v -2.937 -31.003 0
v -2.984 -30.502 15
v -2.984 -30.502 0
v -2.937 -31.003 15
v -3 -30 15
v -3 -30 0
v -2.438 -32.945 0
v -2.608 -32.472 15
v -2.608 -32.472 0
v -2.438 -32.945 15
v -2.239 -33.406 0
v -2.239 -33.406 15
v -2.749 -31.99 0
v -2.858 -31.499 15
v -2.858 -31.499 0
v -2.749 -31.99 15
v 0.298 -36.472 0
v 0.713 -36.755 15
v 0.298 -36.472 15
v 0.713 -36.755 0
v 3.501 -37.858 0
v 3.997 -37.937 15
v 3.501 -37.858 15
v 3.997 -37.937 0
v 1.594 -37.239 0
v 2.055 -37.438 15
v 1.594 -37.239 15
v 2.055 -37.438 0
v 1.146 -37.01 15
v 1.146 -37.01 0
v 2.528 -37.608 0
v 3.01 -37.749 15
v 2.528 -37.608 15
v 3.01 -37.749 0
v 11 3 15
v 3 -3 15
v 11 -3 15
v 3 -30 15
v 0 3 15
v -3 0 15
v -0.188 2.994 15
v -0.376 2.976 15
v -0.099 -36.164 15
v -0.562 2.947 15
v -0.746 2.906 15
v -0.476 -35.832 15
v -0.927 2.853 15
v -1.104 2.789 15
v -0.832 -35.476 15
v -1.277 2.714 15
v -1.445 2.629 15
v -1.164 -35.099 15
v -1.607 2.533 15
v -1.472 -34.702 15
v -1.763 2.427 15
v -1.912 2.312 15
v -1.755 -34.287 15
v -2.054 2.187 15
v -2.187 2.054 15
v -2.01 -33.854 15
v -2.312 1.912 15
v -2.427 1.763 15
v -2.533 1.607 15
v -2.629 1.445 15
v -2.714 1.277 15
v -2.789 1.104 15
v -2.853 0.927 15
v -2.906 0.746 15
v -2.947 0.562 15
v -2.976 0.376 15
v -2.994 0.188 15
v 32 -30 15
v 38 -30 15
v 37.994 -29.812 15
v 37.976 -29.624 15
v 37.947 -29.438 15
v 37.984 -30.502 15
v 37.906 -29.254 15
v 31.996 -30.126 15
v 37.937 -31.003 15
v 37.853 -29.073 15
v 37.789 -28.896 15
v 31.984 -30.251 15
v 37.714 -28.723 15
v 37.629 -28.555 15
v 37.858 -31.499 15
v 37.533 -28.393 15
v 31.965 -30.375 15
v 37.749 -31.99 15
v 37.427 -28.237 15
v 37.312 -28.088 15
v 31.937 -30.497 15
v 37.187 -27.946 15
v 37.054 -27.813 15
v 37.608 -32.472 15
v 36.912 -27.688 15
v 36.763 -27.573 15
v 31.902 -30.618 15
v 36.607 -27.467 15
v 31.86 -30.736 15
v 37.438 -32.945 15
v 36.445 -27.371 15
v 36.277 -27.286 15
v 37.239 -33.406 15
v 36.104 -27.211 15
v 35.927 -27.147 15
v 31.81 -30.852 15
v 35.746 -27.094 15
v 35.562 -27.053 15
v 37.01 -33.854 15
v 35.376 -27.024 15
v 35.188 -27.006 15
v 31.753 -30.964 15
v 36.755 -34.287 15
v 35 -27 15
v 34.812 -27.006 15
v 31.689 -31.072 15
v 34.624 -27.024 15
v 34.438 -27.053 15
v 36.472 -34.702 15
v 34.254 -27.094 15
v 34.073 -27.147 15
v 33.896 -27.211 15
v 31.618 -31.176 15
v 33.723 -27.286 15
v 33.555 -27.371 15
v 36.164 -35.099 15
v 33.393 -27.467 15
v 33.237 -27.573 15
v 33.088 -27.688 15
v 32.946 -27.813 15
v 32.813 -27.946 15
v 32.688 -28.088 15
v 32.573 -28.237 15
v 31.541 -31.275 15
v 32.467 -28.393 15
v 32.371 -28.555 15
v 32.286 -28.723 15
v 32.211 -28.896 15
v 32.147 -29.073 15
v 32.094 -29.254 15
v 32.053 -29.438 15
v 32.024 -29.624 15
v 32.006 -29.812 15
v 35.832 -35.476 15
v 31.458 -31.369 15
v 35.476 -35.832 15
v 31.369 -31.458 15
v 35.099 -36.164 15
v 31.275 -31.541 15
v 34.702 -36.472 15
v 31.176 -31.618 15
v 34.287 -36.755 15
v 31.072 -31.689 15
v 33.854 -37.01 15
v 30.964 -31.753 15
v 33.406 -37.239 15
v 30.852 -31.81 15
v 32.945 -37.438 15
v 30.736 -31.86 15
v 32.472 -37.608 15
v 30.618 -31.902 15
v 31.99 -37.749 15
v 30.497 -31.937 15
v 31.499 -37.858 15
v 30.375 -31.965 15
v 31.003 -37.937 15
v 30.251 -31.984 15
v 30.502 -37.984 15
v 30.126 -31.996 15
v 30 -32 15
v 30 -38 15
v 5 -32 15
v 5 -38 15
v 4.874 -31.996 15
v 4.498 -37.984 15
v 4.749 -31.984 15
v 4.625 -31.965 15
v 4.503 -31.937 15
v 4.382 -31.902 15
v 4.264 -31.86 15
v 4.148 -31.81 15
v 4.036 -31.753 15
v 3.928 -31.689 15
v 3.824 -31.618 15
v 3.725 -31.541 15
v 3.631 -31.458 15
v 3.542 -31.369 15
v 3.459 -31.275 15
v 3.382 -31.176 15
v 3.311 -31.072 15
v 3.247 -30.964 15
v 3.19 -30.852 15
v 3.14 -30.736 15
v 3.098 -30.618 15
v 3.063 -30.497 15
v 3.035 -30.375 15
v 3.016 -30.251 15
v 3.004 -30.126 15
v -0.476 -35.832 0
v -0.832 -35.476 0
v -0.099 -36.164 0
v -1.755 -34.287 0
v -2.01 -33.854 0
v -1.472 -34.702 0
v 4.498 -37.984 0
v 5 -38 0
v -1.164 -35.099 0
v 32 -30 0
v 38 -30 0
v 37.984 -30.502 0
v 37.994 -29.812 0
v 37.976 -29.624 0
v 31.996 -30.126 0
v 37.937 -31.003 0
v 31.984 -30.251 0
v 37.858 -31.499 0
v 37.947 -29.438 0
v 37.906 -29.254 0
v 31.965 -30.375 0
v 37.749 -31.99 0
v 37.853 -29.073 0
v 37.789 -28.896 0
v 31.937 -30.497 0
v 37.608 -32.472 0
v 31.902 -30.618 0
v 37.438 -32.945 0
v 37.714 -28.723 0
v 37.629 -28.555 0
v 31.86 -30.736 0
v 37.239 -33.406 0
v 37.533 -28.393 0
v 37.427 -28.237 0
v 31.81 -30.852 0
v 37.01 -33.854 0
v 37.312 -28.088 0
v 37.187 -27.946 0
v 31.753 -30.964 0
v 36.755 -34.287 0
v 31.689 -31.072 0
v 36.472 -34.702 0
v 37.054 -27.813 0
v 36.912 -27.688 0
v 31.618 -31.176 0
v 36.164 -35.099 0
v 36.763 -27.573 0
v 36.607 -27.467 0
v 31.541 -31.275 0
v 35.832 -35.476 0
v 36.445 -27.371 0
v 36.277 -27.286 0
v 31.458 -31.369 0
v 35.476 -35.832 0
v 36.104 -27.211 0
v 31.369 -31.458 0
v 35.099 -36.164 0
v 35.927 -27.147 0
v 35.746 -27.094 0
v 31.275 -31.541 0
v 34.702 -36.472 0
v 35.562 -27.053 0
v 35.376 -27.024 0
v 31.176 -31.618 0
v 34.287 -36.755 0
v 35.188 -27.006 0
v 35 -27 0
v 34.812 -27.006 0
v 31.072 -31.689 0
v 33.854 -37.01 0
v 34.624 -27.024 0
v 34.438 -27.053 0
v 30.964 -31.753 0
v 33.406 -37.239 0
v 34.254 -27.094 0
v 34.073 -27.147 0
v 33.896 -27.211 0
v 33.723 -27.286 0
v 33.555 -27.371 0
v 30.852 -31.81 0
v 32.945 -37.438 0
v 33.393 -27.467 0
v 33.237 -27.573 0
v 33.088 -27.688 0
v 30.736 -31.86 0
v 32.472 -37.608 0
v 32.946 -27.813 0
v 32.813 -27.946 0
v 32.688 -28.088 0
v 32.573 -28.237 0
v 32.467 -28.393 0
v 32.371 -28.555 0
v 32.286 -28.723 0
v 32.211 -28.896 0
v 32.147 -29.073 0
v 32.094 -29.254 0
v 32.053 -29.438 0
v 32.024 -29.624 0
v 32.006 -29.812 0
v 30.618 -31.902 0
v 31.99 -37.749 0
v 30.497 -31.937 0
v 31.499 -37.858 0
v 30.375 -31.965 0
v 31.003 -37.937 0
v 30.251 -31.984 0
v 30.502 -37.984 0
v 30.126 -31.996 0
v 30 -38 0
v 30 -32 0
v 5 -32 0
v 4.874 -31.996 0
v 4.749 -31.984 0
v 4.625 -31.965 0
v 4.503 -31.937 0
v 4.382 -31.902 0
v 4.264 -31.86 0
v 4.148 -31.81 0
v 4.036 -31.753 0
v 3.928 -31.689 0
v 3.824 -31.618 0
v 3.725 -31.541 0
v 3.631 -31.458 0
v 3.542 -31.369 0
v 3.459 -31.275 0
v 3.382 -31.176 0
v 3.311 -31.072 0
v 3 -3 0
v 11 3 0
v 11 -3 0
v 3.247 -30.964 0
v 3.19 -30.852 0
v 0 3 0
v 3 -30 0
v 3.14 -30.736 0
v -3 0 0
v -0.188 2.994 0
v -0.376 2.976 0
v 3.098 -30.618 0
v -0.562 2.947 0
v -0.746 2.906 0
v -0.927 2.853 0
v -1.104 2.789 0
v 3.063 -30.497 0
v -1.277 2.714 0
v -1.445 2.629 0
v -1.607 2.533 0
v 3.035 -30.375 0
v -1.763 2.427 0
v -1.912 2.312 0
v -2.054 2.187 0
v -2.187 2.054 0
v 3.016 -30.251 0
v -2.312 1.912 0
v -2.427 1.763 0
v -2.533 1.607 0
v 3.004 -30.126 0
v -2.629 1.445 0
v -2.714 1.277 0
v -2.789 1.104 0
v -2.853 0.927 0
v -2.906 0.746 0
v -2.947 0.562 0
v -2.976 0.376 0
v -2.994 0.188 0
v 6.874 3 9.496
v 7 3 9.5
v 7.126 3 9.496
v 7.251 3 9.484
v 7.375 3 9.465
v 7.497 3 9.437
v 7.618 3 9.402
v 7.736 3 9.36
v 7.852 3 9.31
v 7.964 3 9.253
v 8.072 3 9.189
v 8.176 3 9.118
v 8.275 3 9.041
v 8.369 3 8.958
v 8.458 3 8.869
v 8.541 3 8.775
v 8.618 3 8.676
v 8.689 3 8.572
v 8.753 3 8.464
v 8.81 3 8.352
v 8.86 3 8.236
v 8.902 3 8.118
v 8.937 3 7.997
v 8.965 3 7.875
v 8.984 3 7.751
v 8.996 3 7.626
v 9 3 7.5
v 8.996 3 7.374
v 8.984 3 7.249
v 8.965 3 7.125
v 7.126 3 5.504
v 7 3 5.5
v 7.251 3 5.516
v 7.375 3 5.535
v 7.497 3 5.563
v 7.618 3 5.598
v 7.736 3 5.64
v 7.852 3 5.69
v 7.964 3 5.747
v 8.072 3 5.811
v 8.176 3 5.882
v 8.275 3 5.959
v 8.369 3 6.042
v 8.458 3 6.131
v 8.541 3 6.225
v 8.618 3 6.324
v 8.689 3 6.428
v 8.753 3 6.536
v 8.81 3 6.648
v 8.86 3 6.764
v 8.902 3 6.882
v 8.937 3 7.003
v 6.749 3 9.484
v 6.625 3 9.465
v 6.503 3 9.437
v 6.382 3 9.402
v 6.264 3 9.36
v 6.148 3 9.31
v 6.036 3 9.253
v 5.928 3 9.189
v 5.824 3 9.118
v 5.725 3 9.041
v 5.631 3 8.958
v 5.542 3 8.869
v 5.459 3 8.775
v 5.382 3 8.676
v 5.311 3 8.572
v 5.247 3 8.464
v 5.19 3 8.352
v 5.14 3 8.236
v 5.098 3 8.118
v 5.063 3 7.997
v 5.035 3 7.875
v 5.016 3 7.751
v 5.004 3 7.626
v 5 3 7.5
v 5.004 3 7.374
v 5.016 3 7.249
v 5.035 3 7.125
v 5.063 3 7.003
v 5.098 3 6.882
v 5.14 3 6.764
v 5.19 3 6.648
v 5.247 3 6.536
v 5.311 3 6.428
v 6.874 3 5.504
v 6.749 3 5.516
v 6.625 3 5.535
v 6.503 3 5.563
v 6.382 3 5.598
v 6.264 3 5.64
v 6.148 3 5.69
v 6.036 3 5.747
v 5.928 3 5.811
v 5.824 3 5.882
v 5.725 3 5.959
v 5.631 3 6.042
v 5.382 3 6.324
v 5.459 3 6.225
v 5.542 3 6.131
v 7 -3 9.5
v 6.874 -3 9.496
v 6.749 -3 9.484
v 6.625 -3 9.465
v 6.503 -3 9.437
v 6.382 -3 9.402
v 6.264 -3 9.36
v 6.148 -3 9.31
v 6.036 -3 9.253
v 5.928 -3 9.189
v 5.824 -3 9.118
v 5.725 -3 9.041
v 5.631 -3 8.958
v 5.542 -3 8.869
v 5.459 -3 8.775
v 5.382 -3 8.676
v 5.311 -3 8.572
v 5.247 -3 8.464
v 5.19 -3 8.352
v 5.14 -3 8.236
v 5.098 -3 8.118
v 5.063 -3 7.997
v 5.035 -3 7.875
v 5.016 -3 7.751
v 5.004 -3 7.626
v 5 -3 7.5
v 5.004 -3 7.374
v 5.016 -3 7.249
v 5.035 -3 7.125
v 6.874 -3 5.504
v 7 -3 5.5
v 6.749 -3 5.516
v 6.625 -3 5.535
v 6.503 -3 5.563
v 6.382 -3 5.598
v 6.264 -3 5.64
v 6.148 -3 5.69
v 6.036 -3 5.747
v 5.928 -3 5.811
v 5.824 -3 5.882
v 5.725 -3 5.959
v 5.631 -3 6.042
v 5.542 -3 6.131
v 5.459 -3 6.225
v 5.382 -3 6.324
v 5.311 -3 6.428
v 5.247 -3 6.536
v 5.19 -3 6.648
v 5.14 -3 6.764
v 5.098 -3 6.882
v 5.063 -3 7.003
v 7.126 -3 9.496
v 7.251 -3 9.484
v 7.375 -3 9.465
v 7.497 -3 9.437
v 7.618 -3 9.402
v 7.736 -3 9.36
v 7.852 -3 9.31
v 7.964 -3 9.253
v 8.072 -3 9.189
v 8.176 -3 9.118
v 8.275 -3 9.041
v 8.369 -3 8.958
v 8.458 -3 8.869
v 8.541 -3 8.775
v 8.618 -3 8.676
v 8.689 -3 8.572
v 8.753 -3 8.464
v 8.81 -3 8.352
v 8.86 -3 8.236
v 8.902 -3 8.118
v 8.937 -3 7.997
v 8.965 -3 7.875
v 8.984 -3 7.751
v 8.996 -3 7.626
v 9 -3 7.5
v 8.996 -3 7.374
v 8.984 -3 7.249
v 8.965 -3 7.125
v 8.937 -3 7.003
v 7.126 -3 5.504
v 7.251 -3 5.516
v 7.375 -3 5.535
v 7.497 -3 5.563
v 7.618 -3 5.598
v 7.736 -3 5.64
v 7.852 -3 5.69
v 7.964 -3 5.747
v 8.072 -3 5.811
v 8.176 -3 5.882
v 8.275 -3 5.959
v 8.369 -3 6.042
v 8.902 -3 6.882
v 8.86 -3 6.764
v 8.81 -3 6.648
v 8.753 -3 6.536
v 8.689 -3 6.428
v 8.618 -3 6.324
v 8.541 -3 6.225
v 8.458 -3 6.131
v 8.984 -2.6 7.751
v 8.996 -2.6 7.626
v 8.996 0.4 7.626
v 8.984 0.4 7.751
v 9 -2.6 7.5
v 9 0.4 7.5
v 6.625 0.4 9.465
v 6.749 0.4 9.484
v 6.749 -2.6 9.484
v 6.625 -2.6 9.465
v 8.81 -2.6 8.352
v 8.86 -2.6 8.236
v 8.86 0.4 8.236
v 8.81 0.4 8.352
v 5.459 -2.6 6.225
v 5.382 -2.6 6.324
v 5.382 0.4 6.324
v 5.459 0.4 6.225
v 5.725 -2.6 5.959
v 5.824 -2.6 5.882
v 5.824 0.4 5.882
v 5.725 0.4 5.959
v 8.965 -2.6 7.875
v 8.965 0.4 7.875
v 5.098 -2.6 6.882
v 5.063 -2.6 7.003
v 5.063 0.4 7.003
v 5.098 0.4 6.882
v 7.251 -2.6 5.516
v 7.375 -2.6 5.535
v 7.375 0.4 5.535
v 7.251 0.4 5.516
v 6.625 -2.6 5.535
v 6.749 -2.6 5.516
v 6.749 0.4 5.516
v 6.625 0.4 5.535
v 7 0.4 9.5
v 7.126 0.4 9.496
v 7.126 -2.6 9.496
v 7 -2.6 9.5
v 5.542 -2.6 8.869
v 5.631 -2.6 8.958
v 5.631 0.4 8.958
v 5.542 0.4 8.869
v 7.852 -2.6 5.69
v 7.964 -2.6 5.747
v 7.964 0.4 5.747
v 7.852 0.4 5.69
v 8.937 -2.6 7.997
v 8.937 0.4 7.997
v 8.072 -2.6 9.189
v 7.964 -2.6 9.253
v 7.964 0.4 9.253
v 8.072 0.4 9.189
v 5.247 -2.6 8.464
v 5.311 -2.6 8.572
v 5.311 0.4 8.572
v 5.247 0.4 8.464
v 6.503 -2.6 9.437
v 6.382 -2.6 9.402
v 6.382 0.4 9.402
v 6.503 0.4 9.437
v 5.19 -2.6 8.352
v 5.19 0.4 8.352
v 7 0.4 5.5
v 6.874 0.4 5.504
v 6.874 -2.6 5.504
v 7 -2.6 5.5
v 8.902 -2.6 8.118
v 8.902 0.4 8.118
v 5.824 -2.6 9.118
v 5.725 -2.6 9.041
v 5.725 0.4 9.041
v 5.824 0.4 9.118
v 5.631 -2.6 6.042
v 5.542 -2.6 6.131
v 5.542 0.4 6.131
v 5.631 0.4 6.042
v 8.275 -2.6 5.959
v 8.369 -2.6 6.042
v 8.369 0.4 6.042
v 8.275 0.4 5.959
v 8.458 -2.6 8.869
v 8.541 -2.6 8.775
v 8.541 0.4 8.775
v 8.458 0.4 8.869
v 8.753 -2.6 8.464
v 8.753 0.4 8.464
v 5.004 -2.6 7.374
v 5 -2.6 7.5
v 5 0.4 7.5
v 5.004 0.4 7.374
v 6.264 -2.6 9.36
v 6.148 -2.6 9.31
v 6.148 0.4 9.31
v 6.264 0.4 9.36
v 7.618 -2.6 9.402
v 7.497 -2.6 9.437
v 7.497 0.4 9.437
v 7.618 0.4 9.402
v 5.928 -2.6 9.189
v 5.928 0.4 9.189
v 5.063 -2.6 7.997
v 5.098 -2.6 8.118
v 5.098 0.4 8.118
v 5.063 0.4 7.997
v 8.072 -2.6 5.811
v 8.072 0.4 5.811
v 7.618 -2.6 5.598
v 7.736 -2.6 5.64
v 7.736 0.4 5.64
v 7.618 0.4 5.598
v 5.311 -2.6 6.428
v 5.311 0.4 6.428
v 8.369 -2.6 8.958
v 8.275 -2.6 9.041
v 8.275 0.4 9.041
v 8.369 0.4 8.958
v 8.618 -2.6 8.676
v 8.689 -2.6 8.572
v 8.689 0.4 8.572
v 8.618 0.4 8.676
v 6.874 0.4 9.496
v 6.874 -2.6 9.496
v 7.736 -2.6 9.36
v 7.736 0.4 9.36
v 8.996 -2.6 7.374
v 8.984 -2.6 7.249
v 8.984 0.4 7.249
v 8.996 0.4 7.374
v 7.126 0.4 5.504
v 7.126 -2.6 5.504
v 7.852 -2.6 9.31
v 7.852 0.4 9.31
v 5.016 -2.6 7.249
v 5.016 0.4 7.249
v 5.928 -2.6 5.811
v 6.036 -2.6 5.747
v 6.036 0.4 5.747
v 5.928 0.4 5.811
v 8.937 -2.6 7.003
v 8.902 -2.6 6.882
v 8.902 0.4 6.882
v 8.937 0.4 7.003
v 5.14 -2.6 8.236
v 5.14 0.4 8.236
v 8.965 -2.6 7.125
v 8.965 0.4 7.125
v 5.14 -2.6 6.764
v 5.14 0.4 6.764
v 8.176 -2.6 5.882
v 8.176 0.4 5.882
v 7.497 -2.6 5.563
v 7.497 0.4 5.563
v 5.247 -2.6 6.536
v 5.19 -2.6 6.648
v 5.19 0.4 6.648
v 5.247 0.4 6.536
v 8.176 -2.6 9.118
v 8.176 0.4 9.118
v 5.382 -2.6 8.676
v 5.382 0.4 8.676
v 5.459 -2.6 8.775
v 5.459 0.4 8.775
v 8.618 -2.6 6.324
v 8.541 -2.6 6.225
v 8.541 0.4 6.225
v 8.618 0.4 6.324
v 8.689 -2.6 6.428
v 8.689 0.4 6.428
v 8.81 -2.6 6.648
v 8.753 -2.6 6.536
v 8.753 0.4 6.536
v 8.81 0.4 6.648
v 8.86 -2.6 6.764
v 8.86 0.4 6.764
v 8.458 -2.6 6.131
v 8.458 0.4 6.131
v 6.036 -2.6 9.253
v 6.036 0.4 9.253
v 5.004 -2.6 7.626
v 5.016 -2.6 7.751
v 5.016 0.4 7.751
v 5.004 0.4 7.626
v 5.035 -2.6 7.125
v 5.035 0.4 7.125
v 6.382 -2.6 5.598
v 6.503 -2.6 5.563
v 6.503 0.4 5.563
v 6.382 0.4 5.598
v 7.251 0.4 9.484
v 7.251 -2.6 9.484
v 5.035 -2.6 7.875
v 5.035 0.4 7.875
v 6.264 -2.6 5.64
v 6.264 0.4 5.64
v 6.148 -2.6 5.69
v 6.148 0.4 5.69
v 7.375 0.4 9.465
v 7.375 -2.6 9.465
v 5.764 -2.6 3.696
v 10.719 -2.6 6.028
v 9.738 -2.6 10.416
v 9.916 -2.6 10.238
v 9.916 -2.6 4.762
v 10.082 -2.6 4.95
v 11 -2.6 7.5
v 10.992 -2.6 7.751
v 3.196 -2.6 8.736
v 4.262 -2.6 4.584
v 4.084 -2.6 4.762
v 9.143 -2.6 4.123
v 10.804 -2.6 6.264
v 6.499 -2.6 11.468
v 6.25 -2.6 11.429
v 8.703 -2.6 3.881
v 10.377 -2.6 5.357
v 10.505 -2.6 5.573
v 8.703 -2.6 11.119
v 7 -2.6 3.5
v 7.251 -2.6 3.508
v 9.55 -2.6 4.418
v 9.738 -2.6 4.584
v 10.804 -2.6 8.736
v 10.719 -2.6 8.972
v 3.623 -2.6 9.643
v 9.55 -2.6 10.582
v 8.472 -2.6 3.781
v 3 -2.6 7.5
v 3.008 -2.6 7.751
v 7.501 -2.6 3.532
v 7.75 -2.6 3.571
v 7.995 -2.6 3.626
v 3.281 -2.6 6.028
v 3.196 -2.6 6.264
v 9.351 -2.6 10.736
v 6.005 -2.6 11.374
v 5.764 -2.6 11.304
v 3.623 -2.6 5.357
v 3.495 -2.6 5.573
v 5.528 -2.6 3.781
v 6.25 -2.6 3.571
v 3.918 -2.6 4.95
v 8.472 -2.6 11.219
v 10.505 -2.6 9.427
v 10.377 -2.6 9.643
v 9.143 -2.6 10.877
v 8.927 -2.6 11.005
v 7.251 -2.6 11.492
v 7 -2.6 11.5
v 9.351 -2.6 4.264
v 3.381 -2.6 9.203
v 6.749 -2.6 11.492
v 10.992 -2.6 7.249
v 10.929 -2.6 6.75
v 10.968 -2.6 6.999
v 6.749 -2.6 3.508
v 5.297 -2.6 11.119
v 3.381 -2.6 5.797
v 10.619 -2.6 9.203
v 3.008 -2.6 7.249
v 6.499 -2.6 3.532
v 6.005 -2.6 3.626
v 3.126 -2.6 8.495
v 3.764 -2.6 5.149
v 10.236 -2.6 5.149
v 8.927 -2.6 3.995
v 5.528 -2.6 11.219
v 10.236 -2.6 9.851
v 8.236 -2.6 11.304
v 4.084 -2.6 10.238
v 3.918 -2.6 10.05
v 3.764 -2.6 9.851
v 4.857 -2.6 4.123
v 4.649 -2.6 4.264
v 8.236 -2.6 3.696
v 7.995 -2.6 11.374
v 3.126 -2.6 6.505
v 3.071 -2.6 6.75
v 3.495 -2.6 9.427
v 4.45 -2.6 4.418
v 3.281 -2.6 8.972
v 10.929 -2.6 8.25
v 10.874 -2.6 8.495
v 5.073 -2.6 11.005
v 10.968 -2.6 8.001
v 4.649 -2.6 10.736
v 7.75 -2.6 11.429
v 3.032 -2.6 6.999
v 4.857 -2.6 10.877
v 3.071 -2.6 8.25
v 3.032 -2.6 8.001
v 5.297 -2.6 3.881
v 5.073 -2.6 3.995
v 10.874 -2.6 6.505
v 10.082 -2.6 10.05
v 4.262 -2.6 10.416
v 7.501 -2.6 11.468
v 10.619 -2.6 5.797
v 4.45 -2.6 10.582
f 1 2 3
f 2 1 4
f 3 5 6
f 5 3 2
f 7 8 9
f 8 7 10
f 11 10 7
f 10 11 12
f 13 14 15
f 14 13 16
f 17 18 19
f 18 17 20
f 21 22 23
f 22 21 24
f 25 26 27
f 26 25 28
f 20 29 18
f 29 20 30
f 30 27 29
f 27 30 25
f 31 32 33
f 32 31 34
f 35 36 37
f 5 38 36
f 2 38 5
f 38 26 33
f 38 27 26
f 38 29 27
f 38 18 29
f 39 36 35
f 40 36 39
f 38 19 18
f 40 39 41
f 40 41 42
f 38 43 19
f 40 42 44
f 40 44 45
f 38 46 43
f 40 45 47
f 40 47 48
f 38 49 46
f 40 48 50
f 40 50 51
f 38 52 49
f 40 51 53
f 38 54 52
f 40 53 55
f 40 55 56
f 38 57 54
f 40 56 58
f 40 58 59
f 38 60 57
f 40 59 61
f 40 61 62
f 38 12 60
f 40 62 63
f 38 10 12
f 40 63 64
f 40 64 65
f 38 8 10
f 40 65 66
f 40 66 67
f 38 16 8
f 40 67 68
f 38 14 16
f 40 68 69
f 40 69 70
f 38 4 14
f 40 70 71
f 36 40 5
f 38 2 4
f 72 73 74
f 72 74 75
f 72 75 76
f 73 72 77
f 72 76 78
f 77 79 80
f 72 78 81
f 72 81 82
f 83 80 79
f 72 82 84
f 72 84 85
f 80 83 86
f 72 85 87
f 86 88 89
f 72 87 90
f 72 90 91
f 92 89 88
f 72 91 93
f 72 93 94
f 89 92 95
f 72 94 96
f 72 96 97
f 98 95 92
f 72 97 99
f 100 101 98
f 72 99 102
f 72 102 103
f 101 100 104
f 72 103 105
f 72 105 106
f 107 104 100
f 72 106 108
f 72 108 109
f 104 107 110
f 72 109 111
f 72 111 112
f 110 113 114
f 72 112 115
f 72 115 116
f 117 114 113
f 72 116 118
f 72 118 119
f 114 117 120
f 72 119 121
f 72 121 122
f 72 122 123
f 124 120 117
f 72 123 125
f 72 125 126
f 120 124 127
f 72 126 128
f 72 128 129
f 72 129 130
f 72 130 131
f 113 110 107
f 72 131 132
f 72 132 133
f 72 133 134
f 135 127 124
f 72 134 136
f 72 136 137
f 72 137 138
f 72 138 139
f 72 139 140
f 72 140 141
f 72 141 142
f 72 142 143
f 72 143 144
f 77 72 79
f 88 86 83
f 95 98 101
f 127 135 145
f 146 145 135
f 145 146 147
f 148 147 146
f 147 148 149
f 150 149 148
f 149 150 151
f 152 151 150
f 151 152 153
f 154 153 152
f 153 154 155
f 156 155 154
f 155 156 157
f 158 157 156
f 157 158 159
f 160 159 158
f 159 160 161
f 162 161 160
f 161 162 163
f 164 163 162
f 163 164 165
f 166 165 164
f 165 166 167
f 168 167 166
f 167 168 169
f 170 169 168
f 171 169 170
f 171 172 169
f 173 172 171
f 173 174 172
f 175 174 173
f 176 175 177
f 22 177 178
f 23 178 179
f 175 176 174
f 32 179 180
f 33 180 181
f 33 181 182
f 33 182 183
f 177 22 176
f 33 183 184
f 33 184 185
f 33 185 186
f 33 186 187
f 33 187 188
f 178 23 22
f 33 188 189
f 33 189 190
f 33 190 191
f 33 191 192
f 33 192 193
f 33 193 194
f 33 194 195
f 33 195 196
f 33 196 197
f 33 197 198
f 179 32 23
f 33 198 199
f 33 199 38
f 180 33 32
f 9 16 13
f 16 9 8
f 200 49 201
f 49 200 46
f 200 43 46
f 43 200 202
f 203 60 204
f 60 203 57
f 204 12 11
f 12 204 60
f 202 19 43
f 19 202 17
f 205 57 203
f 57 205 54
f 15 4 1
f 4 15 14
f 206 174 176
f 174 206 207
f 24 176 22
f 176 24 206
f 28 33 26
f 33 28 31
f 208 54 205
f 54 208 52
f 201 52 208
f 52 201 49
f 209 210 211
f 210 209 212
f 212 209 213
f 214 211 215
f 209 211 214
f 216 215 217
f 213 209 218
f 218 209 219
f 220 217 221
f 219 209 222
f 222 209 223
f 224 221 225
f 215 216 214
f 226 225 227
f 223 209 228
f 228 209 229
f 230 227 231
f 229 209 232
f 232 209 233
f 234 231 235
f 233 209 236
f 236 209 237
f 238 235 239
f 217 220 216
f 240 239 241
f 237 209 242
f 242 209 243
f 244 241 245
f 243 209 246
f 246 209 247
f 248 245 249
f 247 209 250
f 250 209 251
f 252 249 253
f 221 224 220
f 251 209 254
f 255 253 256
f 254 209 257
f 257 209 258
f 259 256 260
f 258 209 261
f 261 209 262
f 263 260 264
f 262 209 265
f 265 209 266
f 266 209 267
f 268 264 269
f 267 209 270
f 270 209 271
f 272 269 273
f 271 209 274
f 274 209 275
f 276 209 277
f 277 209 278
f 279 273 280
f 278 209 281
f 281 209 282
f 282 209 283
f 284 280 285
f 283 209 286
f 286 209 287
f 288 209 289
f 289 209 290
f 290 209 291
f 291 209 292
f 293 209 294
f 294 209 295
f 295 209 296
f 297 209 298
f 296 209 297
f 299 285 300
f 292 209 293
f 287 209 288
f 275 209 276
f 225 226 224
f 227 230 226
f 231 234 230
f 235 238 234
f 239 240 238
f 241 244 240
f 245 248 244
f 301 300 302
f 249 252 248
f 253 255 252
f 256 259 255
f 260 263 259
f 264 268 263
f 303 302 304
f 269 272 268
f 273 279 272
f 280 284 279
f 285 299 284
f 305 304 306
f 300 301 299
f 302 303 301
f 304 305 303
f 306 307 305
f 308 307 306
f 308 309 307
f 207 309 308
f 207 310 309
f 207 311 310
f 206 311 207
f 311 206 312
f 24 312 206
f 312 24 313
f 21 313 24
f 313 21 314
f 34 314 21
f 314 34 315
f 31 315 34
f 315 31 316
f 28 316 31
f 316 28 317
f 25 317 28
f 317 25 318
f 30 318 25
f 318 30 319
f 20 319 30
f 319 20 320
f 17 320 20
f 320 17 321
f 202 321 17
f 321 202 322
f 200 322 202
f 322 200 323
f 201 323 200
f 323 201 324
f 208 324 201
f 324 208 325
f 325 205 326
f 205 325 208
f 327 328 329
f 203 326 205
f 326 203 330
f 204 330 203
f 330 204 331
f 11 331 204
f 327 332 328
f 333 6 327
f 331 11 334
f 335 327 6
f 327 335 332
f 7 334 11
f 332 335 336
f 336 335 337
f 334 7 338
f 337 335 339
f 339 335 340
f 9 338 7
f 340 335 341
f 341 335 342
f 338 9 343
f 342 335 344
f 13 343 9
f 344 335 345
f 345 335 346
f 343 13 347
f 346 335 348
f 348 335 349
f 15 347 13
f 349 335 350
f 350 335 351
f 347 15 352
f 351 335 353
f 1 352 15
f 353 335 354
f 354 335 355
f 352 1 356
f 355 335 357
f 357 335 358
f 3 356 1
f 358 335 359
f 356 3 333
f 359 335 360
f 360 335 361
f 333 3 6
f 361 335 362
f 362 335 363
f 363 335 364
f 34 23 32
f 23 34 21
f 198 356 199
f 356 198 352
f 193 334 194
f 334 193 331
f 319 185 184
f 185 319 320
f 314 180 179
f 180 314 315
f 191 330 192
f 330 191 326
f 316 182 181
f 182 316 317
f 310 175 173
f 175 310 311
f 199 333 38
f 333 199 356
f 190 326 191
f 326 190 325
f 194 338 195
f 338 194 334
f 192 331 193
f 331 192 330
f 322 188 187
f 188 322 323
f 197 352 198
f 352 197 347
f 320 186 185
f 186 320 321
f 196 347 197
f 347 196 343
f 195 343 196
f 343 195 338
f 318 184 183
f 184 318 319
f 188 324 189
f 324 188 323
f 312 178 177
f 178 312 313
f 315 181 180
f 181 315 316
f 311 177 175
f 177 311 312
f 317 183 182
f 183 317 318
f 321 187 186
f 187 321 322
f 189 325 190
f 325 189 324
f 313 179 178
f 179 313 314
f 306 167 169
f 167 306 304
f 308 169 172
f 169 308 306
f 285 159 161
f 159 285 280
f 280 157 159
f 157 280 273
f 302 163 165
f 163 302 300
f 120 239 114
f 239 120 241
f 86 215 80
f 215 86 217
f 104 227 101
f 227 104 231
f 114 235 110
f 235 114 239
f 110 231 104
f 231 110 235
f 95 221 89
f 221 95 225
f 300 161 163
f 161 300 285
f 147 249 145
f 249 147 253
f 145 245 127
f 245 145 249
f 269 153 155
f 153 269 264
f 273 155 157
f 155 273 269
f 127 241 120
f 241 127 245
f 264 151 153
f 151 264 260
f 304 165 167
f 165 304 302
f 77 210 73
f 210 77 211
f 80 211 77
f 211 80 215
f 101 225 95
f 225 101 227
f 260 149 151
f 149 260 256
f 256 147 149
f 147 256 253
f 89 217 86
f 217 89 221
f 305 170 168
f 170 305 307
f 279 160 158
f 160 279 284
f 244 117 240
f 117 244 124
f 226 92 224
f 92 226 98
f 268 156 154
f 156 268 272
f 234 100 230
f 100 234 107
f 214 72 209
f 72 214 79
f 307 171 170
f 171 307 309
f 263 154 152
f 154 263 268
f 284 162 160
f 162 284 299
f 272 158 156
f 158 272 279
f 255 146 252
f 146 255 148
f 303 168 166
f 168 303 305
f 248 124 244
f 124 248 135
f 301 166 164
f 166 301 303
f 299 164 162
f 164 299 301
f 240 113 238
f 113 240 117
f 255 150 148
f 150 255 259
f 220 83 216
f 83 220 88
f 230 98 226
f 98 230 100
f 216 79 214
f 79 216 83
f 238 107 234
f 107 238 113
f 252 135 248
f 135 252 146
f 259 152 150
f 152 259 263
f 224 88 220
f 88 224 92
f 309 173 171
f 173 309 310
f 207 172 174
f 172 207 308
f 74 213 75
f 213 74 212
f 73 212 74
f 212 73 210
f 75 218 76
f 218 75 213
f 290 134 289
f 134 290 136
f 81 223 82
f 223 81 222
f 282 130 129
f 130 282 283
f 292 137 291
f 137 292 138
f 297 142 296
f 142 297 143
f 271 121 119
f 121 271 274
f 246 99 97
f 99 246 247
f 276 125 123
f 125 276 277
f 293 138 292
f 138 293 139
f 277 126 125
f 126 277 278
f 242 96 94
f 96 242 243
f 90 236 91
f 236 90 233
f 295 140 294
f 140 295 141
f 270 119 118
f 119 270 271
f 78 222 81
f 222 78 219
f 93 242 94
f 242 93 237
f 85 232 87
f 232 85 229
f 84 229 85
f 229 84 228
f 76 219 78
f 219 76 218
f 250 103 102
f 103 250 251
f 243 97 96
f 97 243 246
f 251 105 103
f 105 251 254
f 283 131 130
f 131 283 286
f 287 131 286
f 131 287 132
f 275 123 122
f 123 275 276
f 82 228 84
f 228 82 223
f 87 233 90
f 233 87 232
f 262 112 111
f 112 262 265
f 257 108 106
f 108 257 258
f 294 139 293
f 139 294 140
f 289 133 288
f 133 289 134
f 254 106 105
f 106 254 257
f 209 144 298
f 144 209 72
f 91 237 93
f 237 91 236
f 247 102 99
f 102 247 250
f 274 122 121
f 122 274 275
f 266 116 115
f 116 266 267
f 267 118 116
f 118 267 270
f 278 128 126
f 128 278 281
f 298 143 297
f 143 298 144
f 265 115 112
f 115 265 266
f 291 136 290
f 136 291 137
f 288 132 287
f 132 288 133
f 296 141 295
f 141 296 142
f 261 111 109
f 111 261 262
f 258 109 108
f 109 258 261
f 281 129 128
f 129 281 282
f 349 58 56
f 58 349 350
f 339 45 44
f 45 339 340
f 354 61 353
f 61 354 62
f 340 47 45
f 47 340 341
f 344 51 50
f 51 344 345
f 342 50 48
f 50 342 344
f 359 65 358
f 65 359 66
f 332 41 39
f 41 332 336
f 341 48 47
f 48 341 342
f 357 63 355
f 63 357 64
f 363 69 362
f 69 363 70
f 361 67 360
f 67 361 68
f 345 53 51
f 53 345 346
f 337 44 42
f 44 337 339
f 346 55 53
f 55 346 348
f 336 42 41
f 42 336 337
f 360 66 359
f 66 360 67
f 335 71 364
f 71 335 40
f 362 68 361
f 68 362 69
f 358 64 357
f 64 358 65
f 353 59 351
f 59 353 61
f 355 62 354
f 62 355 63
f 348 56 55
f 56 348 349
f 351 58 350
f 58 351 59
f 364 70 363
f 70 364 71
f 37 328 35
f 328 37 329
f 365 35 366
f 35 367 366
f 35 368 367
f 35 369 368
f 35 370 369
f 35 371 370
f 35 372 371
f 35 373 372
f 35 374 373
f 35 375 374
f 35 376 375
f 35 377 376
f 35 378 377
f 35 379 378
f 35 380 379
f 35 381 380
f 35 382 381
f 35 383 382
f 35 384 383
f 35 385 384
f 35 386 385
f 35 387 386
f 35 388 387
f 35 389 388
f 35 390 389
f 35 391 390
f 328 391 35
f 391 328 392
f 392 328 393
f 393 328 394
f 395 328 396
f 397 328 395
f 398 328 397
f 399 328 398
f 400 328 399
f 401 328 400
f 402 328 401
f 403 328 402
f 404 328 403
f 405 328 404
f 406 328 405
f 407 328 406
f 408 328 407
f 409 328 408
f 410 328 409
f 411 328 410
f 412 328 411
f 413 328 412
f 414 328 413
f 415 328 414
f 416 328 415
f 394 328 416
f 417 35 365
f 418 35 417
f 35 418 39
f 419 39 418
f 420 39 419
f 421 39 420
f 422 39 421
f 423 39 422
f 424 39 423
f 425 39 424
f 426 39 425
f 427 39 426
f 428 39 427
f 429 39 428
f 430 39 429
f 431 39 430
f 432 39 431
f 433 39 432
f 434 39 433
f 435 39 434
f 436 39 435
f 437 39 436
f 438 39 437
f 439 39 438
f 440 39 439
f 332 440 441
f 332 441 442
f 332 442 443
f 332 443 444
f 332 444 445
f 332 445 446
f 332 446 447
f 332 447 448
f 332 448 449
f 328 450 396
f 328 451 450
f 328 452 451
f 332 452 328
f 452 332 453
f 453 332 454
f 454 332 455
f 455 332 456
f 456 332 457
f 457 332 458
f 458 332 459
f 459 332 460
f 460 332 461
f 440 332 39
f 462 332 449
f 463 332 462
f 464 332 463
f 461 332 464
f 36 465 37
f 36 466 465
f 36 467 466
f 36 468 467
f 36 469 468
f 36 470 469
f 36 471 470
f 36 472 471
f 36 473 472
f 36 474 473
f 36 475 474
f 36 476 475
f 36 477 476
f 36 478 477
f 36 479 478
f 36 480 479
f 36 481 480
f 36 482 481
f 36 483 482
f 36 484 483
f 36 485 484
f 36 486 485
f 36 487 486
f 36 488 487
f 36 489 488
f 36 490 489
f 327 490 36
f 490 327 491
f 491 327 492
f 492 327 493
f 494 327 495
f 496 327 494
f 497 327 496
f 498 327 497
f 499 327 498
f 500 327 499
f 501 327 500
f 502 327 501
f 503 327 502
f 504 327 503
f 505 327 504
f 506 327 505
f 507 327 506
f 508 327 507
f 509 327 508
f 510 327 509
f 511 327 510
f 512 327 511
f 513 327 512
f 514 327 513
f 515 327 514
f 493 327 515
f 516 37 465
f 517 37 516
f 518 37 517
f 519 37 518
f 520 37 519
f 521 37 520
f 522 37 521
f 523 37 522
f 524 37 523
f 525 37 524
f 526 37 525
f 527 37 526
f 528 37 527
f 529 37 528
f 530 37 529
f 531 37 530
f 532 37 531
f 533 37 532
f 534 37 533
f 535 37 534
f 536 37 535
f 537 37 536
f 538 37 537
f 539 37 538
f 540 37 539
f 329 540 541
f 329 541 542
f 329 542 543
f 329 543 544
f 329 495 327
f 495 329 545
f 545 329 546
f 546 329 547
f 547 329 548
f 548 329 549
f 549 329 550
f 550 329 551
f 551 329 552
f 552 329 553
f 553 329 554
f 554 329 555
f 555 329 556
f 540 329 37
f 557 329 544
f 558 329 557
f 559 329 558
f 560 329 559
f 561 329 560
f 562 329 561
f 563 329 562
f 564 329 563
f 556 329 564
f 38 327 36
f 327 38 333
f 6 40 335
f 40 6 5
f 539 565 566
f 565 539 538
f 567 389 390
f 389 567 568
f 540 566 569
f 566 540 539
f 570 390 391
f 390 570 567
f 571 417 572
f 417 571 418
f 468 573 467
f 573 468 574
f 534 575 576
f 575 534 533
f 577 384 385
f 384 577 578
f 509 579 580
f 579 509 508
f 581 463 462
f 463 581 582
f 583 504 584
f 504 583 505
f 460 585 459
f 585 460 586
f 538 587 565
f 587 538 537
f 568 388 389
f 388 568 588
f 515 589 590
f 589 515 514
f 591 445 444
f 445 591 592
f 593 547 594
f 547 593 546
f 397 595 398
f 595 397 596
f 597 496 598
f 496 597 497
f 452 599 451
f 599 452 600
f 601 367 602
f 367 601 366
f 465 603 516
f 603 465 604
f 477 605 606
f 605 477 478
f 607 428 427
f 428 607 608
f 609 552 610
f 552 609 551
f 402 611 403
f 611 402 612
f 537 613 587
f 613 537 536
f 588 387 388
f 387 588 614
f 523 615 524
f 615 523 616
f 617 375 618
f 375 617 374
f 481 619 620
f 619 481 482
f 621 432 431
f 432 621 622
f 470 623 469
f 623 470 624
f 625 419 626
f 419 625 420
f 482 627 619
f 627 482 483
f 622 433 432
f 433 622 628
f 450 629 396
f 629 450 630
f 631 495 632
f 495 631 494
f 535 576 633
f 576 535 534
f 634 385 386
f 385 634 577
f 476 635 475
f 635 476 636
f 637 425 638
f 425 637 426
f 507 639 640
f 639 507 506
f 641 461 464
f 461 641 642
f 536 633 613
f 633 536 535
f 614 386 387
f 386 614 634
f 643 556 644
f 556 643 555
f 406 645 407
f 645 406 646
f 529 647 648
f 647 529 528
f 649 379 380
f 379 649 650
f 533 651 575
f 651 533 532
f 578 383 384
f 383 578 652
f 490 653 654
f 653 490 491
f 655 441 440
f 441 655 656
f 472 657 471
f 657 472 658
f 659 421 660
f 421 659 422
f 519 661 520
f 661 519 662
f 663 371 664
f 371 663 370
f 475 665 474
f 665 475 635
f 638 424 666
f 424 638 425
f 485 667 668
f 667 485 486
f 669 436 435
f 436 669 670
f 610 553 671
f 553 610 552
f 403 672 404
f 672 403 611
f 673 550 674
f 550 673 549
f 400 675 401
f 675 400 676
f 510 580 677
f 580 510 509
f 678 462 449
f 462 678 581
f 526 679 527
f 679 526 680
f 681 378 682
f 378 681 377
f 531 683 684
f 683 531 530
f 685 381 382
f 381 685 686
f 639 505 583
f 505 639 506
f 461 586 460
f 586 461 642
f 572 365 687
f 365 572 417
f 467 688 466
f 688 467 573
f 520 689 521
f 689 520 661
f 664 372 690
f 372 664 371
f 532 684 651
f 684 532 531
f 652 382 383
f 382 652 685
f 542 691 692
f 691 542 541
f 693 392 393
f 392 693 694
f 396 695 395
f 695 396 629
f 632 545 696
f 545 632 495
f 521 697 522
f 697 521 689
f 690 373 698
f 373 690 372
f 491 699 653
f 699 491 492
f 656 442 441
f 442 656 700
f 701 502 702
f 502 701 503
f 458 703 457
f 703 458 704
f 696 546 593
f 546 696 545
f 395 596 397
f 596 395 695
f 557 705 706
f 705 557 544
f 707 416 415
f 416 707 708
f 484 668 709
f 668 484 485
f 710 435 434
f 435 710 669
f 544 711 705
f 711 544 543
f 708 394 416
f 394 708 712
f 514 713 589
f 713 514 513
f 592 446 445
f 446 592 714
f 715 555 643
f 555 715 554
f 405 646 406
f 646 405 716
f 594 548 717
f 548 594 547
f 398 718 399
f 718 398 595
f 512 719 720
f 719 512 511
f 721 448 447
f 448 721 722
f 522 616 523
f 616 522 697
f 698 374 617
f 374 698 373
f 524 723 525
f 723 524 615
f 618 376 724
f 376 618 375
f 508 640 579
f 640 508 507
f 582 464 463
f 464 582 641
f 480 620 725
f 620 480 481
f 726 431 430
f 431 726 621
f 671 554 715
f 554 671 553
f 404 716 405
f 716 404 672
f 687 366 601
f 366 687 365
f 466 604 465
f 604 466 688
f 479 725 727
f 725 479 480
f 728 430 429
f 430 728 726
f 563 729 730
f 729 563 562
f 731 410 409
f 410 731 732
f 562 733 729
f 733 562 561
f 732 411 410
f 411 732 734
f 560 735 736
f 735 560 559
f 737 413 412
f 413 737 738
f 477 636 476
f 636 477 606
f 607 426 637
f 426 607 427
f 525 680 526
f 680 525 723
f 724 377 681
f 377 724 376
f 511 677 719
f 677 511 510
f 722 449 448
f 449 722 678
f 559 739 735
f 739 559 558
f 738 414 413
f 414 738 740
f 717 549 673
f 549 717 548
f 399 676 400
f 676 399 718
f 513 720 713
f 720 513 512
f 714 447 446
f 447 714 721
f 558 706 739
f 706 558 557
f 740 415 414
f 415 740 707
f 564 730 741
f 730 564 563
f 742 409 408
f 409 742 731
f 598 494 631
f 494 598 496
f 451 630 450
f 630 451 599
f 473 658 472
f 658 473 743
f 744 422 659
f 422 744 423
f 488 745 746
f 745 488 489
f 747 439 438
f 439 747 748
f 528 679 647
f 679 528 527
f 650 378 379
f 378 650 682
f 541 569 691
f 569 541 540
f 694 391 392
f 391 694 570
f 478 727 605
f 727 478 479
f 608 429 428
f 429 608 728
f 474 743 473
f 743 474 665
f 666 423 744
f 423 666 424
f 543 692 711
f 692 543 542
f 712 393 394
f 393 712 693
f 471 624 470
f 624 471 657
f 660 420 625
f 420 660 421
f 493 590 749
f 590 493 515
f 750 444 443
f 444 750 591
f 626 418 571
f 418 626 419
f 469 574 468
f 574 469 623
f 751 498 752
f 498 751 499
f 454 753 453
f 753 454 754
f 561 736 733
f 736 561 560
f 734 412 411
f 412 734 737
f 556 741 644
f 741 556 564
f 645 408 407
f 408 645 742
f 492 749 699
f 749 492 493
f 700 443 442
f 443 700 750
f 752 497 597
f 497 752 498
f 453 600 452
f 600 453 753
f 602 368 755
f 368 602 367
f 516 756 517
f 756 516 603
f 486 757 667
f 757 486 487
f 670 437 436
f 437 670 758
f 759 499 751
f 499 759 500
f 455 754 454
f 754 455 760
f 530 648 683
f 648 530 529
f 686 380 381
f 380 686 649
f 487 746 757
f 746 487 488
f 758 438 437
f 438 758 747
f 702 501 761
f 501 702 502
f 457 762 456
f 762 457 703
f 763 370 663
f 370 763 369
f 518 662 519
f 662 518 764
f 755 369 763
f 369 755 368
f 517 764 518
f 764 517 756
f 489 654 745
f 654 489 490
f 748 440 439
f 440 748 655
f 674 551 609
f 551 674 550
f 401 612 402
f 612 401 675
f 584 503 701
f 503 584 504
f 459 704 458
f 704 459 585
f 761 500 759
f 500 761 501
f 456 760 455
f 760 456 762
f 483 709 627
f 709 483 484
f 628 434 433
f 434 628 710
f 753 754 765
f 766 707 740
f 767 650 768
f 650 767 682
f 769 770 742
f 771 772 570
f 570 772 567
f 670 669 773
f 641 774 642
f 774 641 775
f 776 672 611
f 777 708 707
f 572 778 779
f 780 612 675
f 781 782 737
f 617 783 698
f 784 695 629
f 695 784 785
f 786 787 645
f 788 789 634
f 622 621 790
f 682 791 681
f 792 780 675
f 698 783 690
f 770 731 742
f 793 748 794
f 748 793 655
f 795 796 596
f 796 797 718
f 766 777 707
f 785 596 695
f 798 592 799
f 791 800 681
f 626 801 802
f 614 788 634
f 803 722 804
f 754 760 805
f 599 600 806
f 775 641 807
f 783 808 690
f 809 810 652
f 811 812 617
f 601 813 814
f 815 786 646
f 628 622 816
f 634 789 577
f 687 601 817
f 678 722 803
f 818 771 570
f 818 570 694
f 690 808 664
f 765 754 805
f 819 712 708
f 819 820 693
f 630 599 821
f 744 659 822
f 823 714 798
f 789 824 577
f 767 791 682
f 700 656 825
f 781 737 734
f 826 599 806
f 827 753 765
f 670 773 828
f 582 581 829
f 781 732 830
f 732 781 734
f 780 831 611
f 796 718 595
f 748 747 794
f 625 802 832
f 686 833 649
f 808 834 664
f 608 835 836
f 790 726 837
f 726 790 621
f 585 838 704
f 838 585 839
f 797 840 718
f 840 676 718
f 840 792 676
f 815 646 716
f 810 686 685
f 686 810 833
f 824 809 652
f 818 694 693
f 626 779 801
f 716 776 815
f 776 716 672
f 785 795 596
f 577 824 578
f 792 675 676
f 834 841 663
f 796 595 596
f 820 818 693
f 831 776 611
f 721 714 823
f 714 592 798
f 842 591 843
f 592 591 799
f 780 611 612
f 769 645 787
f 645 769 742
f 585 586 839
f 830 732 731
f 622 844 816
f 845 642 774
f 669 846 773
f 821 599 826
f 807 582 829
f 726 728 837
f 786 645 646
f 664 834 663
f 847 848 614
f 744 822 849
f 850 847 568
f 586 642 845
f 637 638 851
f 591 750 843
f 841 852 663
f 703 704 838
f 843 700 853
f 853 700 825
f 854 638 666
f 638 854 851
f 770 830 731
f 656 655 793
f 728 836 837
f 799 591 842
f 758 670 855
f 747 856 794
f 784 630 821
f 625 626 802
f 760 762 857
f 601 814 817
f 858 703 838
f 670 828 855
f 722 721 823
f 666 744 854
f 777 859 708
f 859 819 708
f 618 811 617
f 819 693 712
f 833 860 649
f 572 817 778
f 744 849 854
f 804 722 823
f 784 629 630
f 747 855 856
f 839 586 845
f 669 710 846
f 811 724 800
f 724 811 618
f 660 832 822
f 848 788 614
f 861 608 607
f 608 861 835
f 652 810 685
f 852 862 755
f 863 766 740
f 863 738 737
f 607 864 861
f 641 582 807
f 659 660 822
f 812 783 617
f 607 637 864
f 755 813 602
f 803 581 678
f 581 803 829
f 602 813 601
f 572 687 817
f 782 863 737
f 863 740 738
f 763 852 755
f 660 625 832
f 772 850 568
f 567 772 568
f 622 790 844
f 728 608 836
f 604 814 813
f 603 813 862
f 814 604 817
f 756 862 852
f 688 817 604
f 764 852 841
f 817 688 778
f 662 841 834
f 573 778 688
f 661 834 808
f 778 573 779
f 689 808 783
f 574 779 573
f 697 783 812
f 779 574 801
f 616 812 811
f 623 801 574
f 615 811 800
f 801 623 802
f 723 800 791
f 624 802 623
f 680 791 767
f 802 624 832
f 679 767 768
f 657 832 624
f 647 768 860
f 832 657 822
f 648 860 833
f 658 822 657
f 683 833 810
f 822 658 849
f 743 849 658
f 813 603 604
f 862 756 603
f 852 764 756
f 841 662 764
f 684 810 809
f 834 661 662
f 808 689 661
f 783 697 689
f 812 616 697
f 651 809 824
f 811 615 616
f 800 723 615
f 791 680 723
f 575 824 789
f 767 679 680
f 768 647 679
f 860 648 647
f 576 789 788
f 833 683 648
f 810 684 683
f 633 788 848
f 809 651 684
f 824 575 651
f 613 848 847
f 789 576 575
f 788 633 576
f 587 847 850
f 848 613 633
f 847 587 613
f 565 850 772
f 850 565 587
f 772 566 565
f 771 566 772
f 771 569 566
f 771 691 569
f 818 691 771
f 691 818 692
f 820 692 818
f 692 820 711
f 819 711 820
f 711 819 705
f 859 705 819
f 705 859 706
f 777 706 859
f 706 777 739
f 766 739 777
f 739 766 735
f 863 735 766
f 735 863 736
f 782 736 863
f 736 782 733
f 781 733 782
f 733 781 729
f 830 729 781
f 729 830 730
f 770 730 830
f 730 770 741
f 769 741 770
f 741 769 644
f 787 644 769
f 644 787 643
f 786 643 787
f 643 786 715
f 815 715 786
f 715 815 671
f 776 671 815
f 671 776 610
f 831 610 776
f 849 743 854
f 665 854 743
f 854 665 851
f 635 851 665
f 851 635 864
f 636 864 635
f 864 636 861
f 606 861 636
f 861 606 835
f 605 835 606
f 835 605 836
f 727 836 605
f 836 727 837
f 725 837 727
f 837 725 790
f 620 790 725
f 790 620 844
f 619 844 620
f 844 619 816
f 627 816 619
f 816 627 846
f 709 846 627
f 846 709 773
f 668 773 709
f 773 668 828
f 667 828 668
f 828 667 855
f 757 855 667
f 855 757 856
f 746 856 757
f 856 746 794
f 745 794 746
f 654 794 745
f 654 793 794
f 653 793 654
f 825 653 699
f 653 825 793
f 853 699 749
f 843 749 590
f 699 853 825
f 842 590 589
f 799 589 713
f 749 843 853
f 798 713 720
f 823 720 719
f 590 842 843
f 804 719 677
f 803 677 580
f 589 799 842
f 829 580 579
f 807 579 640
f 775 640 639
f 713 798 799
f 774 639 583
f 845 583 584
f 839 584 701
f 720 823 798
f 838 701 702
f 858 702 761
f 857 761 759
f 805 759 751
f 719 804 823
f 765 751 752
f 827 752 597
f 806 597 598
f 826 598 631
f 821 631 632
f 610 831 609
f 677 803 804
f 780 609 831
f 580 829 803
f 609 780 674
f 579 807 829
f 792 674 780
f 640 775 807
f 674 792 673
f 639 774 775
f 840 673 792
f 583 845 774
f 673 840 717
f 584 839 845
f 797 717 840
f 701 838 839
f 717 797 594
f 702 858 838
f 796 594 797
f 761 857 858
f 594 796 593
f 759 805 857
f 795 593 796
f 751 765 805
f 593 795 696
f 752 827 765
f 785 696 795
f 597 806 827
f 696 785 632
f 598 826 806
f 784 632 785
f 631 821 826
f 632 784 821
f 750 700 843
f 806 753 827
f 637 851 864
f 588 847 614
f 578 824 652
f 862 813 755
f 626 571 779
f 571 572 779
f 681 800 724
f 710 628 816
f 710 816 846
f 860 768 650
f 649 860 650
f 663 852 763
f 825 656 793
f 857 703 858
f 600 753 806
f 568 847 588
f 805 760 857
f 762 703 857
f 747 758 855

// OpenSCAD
// file: lib.scad
module round1_4(radius, width, height) {
  translate([0,radius-width/2,0])
  rotate([0, 0, -90])
  intersection() {
    difference() {
      cylinder(r=radius, h=height, center=false);
      translate([0,0,-1])cylinder(r=radius-width, h=height+2, center=false);
    }
    cube(size=radius*2);
  }
}

module round1_8(radius, width) {
  difference() {
  round1_4(radius, width);
  translate([0, radius, -1]) rotate([0, 0, -45]) cube([radius, radius, width + 2]);
  }
}

module flat_hanger(hookRadius, width, h, gape) {
  translate([width/2, 0, 0])
    rotate([0, 0, -90]) round1_4(hookRadius, width, h);

  translate([hookRadius, -hookRadius, 0])
    cube([gape, width, h], center=false);

  translate([hookRadius+gape, width/2-hookRadius, 0])
    rotate([0, 0, 0]) round1_4(hookRadius, width, h);

  translate([2*hookRadius+gape-width/2, 0, 0])
    cylinder(d=width, h=h, center=false);

}

module round_hanger(hookRadius, width, h) {
  translate([width/2, 0, 0])
    rotate([0, 0, -90]) round1_4(hookRadius, width, h);

  translate([hookRadius, width/2-hookRadius, 0])
    rotate([0, 0, 0]) round1_4(hookRadius, width, h);

  translate([2*hookRadius-width/2, 0, 0])
    cylinder(d=width, h=h, center=false);

  /* difference() { */
  /*   difference() { */
  /*     translate([(hookRadius-width/2),0,0]) cylinder(r=hookRadius, h=h); */
  /*     translate([(hookRadius-width/2),0,0]) cylinder(r=hookRadius-width, h=2*h+2, center=true); */
  /*   } */

  /*   translate([0, 0, -1]) cube([2*hookRadius, hookRadius+2, h+2], center=false); */
  /* } */


  /* translate([2*hookRadius-width, 0, 0]) */
  /*   cylinder(d=width, h=h, center=false); */
}
// main file
use <lib.scad>;

$fn=100;
h=15;
width=6;

module suspended_hook(top, gape, hookRadius, width, h){
  cylinder(d=width, h=h);

  // upper part of the top
  translate([(top)/2, 0, h/2]) cube([top,width,h], center=true);

  // frontside of the top
  backSide = 30;
  translate([0, -backSide/2, h/2]) cube([width,backSide,h], center=true);

  translate([-width/2, -backSide, 0])
    flat_hanger(hookRadius, width, h, gape);
}


gape=25;
top=11;
hookRadius = 8;

difference() {
  suspended_hook(top, gape, hookRadius, width, h);
  translate([(top)/2+1.5, 0, h/2])rotate([90,0,0]) cylinder(d=4, h=10, center=true);
  translate([(top)/2+1.5, 0.4, h/2]) rotate([90, 0, 0]) cylinder(d1=4, d2=8, h=3, center=false);
}
